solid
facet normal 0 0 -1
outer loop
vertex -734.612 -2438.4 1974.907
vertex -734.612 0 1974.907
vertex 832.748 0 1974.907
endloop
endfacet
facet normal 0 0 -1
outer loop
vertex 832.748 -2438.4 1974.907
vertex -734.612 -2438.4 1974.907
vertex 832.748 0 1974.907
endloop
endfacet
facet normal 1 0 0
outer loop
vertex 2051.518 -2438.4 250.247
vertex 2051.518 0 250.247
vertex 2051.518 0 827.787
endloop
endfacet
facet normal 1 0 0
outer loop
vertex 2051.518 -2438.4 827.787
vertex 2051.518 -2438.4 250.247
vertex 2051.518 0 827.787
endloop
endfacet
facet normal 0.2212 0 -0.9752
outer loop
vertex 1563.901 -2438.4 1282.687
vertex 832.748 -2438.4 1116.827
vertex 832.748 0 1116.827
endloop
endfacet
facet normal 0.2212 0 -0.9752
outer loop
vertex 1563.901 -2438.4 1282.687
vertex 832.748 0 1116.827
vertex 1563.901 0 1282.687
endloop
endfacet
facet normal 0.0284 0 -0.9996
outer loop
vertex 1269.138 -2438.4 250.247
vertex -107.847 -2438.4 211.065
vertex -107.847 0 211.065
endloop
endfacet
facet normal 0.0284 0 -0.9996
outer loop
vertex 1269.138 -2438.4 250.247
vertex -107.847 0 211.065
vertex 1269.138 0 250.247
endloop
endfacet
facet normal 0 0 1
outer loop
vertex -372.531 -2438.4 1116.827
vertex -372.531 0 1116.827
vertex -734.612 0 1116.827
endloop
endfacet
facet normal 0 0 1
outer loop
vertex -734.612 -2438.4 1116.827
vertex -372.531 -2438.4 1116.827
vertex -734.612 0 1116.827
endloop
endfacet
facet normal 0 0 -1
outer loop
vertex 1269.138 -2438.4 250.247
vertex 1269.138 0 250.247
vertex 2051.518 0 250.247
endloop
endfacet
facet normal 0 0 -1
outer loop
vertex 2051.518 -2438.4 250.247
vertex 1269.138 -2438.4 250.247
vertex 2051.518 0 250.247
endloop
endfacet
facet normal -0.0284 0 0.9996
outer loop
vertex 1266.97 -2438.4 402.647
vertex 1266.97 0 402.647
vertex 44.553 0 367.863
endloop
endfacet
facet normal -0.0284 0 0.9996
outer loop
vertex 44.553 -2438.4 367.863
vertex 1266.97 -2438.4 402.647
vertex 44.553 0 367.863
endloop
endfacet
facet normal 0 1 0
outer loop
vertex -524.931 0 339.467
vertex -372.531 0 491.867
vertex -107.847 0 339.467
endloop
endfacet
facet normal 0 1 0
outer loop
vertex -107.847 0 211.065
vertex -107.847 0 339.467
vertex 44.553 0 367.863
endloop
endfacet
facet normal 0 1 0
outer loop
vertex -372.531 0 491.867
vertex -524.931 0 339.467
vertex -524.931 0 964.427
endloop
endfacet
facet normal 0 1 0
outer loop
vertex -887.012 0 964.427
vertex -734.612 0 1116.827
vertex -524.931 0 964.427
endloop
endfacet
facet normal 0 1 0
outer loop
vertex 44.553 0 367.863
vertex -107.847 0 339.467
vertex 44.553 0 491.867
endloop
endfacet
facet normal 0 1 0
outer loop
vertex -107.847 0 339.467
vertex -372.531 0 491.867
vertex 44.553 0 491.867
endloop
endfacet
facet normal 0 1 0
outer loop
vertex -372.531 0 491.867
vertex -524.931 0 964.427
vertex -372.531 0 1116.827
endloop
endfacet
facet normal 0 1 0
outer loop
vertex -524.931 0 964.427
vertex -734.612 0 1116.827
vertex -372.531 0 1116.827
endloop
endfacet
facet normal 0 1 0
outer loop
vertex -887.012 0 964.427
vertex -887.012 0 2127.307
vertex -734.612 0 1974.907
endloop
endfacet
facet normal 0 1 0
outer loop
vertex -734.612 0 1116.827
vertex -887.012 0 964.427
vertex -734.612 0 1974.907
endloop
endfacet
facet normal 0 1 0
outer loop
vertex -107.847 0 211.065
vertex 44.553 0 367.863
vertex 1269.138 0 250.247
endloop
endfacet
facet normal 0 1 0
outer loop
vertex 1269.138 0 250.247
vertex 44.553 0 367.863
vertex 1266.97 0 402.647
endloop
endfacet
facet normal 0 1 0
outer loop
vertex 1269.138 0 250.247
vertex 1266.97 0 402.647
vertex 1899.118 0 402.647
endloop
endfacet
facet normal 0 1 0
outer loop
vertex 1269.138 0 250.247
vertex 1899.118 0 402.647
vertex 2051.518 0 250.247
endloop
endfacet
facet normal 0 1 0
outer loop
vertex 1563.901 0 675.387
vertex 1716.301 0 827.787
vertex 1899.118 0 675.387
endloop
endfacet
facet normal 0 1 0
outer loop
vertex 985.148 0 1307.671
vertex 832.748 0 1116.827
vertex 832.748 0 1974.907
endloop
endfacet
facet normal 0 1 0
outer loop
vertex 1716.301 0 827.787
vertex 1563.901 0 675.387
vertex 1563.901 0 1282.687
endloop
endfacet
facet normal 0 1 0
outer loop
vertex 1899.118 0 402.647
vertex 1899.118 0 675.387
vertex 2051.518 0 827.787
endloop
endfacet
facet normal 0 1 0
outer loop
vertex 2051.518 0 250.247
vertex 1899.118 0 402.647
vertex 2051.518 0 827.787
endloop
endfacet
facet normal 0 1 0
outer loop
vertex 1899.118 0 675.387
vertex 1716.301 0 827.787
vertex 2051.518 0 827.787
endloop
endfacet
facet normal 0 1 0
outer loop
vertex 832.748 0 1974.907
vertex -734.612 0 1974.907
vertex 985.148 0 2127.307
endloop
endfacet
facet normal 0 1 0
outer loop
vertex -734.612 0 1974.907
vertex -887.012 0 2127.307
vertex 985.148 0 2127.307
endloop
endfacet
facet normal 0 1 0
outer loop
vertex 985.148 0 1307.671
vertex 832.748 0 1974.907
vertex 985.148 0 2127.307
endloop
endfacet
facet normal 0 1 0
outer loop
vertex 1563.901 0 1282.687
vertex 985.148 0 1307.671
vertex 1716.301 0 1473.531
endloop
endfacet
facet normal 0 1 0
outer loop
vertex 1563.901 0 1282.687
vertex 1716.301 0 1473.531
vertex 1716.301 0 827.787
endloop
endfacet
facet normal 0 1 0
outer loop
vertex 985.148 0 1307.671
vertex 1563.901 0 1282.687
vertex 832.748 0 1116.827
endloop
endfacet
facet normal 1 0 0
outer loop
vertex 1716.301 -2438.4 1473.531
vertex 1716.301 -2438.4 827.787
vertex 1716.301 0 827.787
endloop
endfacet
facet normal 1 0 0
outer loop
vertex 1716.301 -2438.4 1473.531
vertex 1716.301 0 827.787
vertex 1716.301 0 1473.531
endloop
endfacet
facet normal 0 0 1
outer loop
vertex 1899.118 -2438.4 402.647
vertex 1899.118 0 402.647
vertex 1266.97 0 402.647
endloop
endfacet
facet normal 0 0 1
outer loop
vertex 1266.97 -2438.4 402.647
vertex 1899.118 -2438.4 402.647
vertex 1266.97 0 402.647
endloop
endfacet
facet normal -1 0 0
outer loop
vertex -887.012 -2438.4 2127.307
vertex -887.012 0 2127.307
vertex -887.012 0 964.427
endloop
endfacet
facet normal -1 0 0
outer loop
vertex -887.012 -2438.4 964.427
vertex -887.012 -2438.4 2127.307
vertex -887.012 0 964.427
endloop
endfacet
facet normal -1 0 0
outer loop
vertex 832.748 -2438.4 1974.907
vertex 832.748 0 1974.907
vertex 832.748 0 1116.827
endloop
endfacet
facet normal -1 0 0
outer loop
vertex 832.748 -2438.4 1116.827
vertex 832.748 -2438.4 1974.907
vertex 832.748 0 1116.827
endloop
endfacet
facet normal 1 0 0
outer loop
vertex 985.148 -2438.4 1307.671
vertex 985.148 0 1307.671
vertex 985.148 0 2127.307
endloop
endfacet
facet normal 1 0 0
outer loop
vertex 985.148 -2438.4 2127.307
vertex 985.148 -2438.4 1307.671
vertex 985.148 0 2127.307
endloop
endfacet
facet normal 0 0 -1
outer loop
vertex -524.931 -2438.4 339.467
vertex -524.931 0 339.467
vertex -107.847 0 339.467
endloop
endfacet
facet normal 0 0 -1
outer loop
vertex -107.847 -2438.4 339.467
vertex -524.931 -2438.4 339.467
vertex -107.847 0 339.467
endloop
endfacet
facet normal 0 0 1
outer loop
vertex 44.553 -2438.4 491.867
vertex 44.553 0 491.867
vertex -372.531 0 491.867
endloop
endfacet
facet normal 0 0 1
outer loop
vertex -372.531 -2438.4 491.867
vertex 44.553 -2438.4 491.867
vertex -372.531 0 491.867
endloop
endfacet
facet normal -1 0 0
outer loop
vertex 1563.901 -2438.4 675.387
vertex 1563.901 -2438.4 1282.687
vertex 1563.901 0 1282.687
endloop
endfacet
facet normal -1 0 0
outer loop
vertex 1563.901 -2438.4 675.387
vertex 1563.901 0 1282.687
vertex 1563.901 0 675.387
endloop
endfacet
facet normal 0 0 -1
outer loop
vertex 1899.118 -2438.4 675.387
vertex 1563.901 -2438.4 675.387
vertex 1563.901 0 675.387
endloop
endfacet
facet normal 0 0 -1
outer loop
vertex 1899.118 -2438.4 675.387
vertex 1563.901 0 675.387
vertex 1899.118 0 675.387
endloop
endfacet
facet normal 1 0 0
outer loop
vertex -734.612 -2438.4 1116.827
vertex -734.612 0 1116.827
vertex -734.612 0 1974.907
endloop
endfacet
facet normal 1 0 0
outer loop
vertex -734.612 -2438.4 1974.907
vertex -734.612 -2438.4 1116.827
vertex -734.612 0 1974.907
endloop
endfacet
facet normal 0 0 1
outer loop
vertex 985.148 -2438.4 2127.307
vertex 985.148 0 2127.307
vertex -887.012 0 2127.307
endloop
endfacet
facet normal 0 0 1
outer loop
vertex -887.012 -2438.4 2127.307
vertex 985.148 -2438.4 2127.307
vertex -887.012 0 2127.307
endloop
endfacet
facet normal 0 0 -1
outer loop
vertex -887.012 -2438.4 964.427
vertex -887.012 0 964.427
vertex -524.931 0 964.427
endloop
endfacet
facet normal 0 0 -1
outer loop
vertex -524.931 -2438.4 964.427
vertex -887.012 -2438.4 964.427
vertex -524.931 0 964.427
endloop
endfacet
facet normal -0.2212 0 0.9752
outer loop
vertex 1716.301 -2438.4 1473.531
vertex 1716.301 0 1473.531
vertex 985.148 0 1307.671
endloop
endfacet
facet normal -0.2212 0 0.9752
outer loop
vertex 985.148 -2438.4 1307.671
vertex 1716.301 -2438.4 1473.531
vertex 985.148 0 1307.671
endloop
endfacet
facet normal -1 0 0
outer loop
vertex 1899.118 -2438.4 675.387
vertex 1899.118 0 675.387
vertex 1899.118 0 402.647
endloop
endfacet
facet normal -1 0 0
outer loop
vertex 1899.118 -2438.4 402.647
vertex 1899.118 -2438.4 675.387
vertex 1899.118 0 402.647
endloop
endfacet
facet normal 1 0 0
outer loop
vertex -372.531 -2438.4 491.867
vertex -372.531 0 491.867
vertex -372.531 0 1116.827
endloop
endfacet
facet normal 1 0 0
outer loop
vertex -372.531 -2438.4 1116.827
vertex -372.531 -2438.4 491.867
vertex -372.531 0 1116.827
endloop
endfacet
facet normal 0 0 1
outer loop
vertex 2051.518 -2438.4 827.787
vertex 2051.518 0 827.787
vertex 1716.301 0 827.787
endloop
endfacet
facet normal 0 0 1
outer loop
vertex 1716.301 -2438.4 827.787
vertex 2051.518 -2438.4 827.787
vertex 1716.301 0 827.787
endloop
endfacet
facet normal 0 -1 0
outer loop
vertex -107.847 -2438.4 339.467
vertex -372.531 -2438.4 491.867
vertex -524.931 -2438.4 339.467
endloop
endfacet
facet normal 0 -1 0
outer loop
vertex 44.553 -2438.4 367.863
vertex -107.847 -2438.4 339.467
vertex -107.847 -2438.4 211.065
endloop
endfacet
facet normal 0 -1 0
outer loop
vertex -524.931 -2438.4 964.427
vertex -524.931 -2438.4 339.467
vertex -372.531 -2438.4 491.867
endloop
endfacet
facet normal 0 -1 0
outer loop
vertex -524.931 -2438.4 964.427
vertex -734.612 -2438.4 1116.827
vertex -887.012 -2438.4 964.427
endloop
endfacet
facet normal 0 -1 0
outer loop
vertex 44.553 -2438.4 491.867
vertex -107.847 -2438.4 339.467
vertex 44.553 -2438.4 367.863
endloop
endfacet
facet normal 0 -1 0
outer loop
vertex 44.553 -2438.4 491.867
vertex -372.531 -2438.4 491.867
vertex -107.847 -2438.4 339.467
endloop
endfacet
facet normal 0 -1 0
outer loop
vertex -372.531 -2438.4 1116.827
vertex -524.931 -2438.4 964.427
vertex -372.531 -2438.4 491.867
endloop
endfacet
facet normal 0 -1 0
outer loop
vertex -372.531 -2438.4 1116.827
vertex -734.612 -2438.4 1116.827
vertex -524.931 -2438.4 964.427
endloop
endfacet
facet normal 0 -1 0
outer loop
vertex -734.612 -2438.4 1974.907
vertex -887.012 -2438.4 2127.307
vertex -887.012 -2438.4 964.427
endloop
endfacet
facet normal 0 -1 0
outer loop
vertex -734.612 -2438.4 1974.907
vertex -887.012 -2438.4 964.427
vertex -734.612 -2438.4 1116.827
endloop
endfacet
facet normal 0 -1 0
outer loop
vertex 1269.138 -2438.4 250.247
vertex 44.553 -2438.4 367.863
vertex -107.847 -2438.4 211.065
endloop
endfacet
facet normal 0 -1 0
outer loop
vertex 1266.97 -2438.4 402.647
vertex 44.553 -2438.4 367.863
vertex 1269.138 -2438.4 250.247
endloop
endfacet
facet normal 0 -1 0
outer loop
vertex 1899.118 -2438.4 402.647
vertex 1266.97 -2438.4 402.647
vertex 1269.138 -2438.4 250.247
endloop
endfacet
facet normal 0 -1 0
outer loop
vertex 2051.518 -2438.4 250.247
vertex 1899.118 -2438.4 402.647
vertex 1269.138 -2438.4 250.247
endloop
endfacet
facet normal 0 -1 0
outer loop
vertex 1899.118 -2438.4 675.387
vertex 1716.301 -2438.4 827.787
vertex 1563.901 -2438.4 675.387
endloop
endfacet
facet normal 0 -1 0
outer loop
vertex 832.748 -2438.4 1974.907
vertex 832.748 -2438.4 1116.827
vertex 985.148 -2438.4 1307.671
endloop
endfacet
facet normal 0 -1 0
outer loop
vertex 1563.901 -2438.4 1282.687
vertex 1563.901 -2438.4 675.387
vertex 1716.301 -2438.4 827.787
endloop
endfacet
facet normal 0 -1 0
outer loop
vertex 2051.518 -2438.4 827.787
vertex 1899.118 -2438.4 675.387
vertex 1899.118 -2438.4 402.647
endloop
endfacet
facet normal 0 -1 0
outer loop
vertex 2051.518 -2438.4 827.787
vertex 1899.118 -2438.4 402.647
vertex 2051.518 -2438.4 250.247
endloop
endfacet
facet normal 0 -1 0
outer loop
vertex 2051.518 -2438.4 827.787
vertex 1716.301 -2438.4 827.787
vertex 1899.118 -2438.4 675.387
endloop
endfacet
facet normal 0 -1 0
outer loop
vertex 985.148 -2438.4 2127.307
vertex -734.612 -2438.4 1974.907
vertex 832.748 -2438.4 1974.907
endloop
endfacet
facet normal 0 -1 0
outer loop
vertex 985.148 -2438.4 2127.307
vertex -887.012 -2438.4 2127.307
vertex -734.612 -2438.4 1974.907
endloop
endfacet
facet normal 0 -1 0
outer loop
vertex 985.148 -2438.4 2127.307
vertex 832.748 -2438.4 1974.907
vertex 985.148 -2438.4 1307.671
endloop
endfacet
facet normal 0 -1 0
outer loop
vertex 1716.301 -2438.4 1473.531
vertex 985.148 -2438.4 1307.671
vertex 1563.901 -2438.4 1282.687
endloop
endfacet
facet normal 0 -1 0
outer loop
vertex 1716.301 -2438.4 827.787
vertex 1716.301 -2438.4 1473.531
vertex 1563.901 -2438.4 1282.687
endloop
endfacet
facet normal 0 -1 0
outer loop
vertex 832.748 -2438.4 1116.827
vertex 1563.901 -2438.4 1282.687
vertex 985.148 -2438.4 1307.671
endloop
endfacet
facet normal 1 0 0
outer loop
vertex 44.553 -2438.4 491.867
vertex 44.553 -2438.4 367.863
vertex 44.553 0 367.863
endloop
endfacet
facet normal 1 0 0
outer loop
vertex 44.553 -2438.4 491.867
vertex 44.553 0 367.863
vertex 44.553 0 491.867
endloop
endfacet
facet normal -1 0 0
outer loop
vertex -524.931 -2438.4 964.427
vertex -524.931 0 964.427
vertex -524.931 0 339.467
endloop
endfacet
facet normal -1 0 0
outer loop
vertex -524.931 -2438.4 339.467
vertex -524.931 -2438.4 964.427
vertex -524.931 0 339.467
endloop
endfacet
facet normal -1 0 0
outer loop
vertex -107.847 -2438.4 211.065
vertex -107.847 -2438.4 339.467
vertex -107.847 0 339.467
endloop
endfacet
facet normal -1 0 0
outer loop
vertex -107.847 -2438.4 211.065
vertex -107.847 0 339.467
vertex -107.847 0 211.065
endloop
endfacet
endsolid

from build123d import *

# Parameters (mm, degrees)
F1_DEPTH = 2438.4


with BuildPart() as f1:
    # F0 (on Front) → F1 (new body)
    with BuildSketch(Plane.XZ):
        Polygon((-887.011511, 2127.3067), (-887.011511, 964.426909), (-524.931474, 964.426909), (-524.931474, 339.467082), (-107.847057, 339.467082), (-107.847057, 211.064862), (1269.137535, 250.24727), (2051.517725, 250.24727), (2051.517725, 827.787042), (1716.300845, 827.787042), (1716.300845, 1473.530769), (985.148055, 1307.670529), (985.148055, 2127.3067), align=None)
        Polygon((1266.969685, 402.64727), (44.552943, 367.863125), (44.552943, 491.867082), (-372.531474, 491.867082), (-372.531474, 1116.826909), (-734.611511, 1116.826909), (-734.611511, 1974.9067), (832.748055, 1974.9067), (832.748055, 1116.826909), (1563.900845, 1282.687149), (1563.900845, 675.387042), (1899.117725, 675.387042), (1899.117725, 402.64727), align=None, mode=Mode.SUBTRACT)
    extrude(amount=F1_DEPTH)


solid = f1.part
